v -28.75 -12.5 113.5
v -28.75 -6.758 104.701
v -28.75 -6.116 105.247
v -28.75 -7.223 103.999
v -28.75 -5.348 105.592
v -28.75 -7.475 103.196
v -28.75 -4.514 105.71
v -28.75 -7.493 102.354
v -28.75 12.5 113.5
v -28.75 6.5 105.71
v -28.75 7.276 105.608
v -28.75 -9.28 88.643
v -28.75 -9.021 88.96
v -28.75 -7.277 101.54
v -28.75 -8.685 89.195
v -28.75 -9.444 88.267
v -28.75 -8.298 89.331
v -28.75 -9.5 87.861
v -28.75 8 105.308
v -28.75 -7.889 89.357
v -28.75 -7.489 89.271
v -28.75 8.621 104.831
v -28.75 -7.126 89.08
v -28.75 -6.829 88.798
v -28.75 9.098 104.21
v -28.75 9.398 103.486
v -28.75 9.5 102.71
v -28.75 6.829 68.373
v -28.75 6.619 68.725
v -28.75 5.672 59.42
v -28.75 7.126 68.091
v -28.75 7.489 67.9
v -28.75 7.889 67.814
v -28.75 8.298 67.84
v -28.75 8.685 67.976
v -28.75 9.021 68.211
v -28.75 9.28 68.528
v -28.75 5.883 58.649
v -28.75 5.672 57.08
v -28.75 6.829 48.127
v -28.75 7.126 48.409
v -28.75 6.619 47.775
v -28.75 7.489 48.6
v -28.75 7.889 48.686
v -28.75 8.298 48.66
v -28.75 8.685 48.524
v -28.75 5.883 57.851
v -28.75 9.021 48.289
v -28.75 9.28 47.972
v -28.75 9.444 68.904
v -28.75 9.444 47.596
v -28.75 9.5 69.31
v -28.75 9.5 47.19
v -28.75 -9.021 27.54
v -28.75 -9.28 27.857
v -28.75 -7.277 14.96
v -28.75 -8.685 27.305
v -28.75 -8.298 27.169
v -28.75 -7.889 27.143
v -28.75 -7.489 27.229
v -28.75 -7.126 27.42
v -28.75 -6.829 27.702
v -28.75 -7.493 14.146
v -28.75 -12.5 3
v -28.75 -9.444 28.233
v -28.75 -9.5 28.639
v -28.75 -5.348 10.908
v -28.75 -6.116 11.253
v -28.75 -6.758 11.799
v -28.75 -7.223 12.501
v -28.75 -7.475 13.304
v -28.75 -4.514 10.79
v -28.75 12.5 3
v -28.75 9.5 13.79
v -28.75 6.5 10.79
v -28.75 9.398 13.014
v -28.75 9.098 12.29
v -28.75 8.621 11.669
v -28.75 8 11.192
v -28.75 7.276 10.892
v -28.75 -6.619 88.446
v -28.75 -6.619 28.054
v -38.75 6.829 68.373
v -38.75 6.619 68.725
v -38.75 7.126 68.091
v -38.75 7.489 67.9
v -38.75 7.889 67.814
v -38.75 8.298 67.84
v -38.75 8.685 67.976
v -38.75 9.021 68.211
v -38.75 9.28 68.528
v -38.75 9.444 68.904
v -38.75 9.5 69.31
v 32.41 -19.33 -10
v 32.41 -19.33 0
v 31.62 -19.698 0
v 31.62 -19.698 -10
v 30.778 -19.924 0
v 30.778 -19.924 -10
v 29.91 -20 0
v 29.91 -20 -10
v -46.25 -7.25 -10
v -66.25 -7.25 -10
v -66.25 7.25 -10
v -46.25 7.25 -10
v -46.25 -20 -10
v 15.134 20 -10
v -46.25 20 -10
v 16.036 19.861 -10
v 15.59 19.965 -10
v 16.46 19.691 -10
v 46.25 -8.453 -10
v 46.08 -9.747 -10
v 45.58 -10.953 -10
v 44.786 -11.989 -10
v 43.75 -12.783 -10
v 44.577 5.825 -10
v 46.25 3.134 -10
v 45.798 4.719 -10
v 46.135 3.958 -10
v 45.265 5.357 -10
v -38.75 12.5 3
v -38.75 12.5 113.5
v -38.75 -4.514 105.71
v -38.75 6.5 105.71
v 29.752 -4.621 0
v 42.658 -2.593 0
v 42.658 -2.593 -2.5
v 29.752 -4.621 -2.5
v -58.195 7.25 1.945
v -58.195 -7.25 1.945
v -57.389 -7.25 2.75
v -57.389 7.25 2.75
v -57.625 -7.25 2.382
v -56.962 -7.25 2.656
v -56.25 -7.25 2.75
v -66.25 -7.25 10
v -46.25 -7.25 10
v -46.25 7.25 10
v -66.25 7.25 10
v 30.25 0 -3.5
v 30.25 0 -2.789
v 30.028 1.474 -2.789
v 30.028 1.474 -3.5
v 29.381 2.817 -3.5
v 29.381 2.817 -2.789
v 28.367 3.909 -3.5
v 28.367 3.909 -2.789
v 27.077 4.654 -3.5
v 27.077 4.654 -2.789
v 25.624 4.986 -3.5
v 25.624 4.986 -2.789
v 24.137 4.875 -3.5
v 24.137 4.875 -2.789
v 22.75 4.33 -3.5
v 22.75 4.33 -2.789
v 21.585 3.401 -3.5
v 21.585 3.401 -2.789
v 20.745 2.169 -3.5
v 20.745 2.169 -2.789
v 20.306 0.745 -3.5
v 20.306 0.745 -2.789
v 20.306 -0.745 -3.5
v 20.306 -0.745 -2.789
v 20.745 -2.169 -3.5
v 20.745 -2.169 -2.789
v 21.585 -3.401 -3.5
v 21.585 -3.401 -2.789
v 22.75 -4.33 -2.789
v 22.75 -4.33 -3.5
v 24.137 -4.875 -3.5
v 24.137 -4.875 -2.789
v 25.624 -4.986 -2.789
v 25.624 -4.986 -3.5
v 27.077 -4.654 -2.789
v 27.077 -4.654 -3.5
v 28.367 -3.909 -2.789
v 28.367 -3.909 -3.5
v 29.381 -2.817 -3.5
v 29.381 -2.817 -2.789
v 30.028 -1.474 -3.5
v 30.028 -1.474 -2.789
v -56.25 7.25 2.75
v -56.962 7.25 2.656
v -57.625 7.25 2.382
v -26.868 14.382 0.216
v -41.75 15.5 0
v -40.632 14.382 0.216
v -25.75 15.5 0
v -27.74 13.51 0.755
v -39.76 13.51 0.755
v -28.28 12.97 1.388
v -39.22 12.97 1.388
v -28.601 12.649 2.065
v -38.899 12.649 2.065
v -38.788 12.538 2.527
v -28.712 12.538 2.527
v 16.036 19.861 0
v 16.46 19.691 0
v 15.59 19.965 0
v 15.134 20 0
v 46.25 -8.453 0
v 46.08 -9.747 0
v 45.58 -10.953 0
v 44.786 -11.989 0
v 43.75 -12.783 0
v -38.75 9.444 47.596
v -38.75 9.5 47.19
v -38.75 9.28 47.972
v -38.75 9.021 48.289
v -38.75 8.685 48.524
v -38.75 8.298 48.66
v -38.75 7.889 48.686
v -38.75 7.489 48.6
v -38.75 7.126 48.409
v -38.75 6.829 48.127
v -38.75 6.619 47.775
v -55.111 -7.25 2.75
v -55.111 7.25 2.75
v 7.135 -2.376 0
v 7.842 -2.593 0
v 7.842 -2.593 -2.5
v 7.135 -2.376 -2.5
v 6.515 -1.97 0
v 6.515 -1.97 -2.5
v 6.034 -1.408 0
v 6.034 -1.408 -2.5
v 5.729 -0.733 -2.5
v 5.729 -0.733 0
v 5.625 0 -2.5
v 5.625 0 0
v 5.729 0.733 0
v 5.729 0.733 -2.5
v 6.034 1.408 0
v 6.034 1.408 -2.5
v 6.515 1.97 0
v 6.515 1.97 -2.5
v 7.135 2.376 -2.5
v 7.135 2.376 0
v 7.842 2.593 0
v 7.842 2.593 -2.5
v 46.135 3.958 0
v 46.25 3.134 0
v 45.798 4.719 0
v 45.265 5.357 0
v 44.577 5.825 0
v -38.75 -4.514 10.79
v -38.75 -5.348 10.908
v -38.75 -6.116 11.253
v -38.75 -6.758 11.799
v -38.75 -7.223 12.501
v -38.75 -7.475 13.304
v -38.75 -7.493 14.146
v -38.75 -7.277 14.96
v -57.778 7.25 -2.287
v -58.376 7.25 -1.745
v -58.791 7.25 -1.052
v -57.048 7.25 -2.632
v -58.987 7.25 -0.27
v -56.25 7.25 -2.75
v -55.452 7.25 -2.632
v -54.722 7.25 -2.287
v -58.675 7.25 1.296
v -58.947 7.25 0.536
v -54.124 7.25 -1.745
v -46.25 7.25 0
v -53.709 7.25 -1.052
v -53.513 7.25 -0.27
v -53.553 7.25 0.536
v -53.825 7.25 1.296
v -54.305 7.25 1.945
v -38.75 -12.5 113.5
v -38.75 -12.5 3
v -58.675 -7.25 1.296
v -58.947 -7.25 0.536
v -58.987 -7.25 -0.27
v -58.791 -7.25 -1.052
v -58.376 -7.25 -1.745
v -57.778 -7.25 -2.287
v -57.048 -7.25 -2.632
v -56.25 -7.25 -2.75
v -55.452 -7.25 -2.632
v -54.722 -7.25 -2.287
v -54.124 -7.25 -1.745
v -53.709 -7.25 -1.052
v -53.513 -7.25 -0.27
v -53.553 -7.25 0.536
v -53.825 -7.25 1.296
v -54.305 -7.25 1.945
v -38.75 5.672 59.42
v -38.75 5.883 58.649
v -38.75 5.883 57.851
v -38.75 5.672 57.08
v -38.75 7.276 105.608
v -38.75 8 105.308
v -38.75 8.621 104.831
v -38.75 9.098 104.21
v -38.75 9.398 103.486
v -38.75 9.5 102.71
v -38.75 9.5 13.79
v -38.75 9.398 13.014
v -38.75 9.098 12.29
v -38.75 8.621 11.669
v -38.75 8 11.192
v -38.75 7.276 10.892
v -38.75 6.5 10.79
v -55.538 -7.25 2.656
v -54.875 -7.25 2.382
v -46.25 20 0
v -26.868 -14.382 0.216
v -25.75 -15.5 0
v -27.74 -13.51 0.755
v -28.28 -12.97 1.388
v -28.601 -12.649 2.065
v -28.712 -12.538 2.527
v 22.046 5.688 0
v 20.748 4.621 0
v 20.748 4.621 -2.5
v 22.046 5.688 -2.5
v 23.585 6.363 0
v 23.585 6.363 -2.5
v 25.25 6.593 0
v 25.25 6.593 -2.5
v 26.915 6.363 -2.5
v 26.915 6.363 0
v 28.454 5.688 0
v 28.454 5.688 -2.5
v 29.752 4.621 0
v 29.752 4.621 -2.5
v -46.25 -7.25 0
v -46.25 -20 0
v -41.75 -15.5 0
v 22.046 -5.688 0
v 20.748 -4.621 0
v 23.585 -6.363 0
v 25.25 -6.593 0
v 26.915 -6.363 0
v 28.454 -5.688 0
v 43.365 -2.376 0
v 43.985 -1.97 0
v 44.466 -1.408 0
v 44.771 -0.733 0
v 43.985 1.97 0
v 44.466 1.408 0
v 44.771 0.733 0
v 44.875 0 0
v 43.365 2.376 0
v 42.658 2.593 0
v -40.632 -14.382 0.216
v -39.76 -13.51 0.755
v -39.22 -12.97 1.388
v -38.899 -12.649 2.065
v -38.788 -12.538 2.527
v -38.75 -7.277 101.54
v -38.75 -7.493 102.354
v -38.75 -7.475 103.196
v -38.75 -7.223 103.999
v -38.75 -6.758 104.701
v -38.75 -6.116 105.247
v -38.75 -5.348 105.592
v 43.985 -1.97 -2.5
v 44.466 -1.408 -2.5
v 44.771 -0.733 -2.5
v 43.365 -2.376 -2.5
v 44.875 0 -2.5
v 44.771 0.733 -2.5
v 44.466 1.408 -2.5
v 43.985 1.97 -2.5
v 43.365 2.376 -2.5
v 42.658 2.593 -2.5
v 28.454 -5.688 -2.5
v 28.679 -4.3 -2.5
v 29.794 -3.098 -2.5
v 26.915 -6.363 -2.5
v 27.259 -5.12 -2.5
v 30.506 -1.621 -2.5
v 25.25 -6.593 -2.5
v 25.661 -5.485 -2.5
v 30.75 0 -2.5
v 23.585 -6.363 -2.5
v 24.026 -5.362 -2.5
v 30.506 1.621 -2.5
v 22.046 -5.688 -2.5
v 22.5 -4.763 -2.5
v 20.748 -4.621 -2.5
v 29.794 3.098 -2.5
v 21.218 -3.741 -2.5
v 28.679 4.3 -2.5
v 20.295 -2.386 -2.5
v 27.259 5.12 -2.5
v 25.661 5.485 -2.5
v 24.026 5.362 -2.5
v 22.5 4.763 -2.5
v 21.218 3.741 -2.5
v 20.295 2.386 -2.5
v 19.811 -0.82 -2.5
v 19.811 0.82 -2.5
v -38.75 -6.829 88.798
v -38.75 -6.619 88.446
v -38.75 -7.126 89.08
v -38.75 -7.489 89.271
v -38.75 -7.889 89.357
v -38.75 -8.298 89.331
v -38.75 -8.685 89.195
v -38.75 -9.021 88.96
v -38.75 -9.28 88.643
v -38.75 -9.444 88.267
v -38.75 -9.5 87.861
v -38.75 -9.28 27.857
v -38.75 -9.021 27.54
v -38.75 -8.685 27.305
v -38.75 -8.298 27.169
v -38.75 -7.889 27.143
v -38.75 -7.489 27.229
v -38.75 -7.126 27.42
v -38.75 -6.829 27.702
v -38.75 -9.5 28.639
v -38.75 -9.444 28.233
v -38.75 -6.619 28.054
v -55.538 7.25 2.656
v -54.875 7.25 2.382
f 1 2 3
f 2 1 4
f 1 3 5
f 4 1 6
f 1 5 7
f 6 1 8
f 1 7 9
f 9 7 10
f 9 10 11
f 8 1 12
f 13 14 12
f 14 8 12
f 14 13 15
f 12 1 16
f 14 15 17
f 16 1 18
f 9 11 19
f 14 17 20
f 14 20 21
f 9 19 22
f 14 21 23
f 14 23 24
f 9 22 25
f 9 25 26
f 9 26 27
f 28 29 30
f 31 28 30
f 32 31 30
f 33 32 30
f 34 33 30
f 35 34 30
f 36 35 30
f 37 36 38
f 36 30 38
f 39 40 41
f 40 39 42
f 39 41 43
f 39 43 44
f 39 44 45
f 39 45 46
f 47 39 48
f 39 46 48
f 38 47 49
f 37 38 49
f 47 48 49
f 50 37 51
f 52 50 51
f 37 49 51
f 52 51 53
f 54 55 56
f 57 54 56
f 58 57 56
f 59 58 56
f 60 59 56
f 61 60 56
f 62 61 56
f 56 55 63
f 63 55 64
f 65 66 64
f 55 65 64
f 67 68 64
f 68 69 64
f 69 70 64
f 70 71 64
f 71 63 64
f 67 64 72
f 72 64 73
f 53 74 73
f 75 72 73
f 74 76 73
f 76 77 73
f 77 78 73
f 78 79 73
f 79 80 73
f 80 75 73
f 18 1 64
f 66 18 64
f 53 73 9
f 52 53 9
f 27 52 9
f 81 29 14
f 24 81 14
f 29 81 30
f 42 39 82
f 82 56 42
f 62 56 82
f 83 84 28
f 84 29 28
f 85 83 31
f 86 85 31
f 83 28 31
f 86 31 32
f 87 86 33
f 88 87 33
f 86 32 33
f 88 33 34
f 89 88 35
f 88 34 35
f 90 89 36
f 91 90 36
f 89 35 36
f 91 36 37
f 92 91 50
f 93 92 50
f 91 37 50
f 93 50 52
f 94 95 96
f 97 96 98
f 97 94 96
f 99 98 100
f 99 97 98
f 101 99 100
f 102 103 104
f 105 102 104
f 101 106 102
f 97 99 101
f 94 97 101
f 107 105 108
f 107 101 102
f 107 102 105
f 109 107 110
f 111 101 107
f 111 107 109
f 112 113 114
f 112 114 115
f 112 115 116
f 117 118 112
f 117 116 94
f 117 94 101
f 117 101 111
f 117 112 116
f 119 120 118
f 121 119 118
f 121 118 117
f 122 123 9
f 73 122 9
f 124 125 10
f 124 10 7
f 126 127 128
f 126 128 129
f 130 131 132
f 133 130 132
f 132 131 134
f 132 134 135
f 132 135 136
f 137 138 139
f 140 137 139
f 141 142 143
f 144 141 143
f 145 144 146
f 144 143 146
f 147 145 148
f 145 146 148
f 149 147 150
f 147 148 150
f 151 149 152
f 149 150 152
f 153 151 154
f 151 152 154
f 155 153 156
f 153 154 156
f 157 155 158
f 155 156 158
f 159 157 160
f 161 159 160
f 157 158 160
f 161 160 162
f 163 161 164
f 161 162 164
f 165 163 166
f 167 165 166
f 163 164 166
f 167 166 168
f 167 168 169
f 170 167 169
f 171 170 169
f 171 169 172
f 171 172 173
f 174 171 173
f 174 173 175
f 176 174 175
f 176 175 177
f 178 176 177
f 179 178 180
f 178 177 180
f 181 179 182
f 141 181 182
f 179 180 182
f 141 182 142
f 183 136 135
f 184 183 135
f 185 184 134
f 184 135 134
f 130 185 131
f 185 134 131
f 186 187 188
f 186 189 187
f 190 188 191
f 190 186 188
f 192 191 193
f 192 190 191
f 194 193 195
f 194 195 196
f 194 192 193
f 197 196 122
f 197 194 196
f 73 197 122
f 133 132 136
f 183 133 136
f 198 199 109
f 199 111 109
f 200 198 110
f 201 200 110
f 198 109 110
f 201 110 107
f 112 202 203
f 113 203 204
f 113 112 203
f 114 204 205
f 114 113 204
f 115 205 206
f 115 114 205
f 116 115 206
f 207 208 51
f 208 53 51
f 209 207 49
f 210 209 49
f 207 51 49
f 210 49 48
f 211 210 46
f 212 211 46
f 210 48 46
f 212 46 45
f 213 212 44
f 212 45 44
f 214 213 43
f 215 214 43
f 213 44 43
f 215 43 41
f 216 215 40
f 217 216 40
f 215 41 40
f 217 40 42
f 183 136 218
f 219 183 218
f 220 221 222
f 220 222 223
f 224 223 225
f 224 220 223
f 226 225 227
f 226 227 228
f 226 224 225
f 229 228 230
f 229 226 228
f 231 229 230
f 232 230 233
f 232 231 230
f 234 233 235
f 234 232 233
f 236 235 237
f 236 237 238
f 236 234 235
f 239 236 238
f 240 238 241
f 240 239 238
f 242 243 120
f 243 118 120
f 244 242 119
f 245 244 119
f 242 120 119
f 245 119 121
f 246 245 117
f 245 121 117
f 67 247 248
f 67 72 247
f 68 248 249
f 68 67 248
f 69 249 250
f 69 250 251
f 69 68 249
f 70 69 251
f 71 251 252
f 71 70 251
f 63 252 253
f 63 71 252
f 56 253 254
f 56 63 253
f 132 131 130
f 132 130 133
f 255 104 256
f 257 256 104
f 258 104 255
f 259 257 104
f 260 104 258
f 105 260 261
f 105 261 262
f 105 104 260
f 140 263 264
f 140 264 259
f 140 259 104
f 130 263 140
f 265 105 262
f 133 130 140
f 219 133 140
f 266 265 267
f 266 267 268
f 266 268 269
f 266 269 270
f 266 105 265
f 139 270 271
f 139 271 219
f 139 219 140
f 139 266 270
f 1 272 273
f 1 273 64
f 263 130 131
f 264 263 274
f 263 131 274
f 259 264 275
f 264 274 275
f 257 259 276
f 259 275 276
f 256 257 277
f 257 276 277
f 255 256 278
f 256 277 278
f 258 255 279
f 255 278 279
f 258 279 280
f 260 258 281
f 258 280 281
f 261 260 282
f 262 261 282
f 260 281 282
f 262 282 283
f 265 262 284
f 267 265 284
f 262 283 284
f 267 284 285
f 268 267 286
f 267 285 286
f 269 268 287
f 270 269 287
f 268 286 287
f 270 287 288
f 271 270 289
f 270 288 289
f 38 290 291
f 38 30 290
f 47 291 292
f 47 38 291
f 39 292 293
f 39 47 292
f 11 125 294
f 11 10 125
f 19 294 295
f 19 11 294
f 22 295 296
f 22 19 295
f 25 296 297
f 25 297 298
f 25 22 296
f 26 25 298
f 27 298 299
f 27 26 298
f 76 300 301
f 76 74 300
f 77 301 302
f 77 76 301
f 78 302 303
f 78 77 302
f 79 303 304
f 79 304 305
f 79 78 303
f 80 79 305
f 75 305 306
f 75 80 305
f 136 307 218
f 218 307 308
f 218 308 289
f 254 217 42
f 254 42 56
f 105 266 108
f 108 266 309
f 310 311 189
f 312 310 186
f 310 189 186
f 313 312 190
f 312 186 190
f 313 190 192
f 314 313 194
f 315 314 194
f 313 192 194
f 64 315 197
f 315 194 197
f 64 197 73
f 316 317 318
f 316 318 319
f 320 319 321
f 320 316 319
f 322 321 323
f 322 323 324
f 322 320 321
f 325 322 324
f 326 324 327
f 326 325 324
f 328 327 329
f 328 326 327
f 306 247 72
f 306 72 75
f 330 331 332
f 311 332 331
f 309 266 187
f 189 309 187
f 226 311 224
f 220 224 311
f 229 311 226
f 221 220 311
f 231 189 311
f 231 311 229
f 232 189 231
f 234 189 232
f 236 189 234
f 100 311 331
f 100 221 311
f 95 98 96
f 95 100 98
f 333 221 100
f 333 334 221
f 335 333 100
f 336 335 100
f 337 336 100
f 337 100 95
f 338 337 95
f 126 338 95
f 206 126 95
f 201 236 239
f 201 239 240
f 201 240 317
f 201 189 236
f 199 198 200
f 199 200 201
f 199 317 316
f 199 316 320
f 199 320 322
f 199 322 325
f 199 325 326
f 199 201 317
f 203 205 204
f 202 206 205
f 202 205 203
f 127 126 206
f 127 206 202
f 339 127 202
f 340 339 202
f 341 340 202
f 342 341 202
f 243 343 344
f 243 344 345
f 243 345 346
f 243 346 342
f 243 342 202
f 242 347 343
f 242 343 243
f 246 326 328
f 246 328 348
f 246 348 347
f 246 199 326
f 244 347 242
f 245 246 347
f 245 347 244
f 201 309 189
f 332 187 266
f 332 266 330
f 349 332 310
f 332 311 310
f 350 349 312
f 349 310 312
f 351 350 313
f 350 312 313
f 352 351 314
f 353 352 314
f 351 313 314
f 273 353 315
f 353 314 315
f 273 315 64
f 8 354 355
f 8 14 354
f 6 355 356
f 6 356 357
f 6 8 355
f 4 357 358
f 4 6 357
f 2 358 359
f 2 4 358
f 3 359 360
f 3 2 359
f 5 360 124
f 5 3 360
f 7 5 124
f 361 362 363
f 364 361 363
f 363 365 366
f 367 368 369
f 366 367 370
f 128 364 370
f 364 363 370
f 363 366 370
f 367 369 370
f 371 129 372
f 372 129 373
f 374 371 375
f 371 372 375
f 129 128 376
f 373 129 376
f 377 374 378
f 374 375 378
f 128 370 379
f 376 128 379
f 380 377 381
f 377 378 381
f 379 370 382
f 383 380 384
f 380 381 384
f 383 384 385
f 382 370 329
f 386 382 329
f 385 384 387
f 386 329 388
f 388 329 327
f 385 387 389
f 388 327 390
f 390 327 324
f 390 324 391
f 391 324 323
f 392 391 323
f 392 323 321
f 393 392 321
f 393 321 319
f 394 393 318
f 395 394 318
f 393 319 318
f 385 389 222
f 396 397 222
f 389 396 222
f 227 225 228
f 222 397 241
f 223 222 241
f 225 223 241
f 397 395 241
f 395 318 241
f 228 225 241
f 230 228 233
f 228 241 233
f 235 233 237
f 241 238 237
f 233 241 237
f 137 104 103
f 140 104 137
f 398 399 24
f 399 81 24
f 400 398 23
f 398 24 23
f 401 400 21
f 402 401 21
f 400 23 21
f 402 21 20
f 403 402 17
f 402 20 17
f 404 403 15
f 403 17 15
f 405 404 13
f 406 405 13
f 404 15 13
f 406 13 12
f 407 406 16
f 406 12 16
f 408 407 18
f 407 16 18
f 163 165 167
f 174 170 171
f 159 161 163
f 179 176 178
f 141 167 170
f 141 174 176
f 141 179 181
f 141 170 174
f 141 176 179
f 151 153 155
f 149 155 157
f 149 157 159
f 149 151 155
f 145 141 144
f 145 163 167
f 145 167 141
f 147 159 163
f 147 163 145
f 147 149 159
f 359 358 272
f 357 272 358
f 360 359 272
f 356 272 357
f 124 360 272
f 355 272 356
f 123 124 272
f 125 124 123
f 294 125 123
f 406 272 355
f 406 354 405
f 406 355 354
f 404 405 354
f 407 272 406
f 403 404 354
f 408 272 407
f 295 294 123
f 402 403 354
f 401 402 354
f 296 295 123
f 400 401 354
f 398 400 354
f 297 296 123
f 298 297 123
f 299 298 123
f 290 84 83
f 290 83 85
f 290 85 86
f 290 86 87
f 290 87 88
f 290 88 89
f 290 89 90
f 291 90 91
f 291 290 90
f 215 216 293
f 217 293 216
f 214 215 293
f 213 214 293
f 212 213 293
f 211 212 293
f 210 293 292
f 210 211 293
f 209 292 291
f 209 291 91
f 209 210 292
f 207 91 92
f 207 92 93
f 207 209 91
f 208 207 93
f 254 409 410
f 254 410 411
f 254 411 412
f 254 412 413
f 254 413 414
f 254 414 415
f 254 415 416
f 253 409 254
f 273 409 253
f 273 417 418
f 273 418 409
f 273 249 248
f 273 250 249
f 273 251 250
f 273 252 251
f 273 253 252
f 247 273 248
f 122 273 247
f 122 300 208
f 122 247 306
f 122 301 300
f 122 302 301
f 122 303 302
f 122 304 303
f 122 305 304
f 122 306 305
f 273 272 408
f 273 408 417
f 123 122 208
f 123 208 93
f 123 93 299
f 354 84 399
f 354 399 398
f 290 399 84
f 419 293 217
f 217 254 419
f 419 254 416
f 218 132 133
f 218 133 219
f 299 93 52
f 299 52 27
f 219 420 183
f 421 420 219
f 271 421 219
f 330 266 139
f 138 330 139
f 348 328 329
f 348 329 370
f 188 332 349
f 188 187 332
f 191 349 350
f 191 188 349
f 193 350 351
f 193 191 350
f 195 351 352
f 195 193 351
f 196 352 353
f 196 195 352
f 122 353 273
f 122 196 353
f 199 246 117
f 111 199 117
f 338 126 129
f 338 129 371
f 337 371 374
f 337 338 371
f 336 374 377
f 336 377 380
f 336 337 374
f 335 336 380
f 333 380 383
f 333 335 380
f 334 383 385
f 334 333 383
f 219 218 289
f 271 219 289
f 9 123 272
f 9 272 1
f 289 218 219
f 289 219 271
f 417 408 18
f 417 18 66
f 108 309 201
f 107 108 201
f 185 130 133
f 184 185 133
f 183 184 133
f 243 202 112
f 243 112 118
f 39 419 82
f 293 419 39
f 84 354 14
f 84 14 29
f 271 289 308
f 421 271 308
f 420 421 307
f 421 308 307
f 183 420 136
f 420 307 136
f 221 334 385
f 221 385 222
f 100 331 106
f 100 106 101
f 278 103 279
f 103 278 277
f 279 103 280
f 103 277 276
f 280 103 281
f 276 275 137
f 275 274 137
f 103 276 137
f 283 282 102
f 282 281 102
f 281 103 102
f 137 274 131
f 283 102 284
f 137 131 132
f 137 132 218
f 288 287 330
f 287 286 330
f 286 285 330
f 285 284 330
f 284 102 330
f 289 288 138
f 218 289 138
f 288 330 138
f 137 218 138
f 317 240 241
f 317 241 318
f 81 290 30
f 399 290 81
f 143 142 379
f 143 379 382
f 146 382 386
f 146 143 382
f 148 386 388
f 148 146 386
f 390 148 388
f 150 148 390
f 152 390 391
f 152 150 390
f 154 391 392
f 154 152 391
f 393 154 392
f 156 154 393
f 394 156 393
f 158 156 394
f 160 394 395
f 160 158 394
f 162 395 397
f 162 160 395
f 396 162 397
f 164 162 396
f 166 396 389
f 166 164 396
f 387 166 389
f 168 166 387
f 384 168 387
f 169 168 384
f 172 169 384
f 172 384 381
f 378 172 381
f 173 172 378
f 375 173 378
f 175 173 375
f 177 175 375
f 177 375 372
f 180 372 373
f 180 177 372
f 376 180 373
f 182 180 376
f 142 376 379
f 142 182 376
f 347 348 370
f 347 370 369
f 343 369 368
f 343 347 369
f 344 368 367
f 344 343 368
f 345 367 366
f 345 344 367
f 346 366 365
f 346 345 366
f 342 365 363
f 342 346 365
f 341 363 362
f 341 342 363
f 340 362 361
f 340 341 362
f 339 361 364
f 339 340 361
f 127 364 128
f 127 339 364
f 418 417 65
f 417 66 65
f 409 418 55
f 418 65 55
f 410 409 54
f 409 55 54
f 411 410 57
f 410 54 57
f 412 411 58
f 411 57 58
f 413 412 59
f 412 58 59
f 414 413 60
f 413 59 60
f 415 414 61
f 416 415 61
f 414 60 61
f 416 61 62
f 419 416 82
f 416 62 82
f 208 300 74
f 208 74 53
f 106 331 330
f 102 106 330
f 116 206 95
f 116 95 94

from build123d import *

# Parameters (mm, degrees)
SKETCH3_W            = 92.5
SKETCH3_H            = 40
BOSS_EXTRUDE1_DEPTH  = 10
CUT_EXTRUDE1_DEPTH   = 2.5
SKETCH21_W           = 10
SKETCH21_H           = 25
BOSS_EXTRUDE11_DEPTH = 113.5
FILLET1_R            = 3
CUT_EXTRUDE2_DEPTH   = 144.203526493
FILLET4_R            = 3
FILLET5_R            = 1.5
SKETCH25_W           = 20
SKETCH25_H           = 14.5
BOSS_EXTRUDE12_DEPTH = 20
M5_CLEARANCE_HOLE1_D = 5.5
CHAMFER1_SIZE        = 15
CHAMFER1_SIZE2       = 30.41699103
CHAMFER2_SIZE        = 15
CHAMFER2_SIZE2       = 8.660254038
FILLET6_R            = 3
FILLET7_R            = 5
SKETCH28_R           = 5
CUT_EXTRUDE3_DEPTH   = 1
CHAMFER3_SIZE        = 0.5
CHAMFER3_SIZE2       = 0.288675135
SPLIT1_START         = -7.25
SPLIT1_DEPTH         = 14.5
SPLIT1_2_DEPTH       = 14.5
SPLIT1_3_DEPTH       = 14.5


# Read off the part's stored shape, not the designer's step: Split1
with BuildPart() as part:
    # Sketch3 → Boss-Extrude1 (new body)
    with BuildSketch(Plane.XY):
        Rectangle(SKETCH3_W, SKETCH3_H)
    extrude(amount=-BOSS_EXTRUDE1_DEPTH)

    # Sketch2 → Cut-Extrude1 (cut)
    with BuildSketch(Plane.XY):
        with BuildLine():
            Line((7.842480092, 2.593174218), (20.7479962, 4.621288911))
            ThreePointArc((20.7479962, 4.621288911), (25.25, 6.593267506), (29.7520038, 4.621288911))
            Line((29.7520038, 4.621288911), (42.657519908, 2.593174218))
            ThreePointArc((42.657519908, 2.593174218), (44.875, 0), (42.657519908, -2.593174218))
            Line((42.657519908, -2.593174218), (29.7520038, -4.621288911))
            ThreePointArc((29.7520038, -4.621288911), (25.25, -6.593267506), (20.7479962, -4.621288911))
            Line((20.7479962, -4.621288911), (7.842480092, -2.593174218))
            ThreePointArc((7.842480092, -2.593174218), (5.625, 0), (7.842480092, 2.593174218))
        make_face()
    extrude(amount=-CUT_EXTRUDE1_DEPTH, mode=Mode.SUBTRACT)

    # Sketch21 → Boss-Extrude11 (add)
    with BuildSketch(Plane.XY):
        with Locations((-33.75, 0)):
            Rectangle(SKETCH21_W, SKETCH21_H)
    extrude(amount=BOSS_EXTRUDE11_DEPTH)

    # Fillet1
    fillet1_edges = [part.edges().sort_by_distance(p)[0] for p in [
        (-28.75, 0, 0),
        (-33.75, 12.5, 0),
        (-38.75, 0, 0),
        (-33.75, -12.5, 0),
    ]]
    fillet(fillet1_edges, radius=FILLET1_R)

    # Sketch24 → Cut-Extrude2 (cut, through all)
    with BuildSketch(Plane.ZY.offset(38.75)):
        Polygon((95.25, -9.5), (21.25, -9.5), (58.25, 6.167532718), align=None)
        Polygon((54.57929411, 9.5), (10.790027833, -9.042426002), (10.790027833, 9.5), align=None)
        Polygon((61.92070589, 9.5), (105.709972167, 9.5), (105.709972167, -9.042426002), align=None)
    extrude(amount=-CUT_EXTRUDE2_DEPTH, mode=Mode.SUBTRACT)

    # Fillet4
    fillet4_edges = [part.edges().sort_by_distance(p)[0] for p in [
        (-33.75, 9.5, 10.790027833),
        (-33.75, -9.042426002, 10.790027833),
        (-33.75, -9.042426002, 105.709972167),
        (-33.75, 9.5, 105.709972167),
        (-33.75, 6.167532718, 58.25),
    ]]
    fillet(fillet4_edges, radius=FILLET4_R)

    # Fillet5
    fillet5_edges = [part.edges().sort_by_distance(p)[0] for p in [
        (-33.75, 9.5, 54.57929411),
        (-33.75, 9.5, 61.92070589),
        (-33.75, -9.5, 95.25),
        (-33.75, -9.5, 21.25),
    ]]
    fillet(fillet5_edges, radius=FILLET5_R)

    # Sketch25 → Boss-Extrude12 (add)
    with BuildSketch(Plane.ZY.offset(46.25)):
        Rectangle(SKETCH25_W, SKETCH25_H)
    extrude(amount=BOSS_EXTRUDE12_DEPTH)

    # M5 Clearance Hole1 (through all)
    with Locations(Plane(origin=(0, 7.25, 0), x_dir=(1, 0, 0), z_dir=(0, 1, 0))):
        with Locations((-56.25, 0)):
            Hole(M5_CLEARANCE_HOLE1_D / 2)

    # Chamfer1
    chamfer1_edges = [part.edges().sort_by_distance(p)[0] for p in [
        (46.25, 20, -5),
    ]]
    chamfer1_side = [part.faces().sort_by_distance(p)[0] for p in [
        (46.25, 0, -5),
    ]]
    chamfer(chamfer1_edges, length=CHAMFER1_SIZE, length2=CHAMFER1_SIZE2, reference=chamfer1_side[0])

    # Chamfer2
    chamfer2_edges = [part.edges().sort_by_distance(p)[0] for p in [
        (46.25, -20, -5),
    ]]
    chamfer2_side = [part.faces().sort_by_distance(p)[0] for p in [
        (0, -20, -5),
    ]]
    chamfer(chamfer2_edges, length=CHAMFER2_SIZE, length2=CHAMFER2_SIZE2, reference=chamfer2_side[0])

    # Fillet6
    fillet6_edges = [part.edges().sort_by_distance(p)[0] for p in [
        (46.25, 5, -5),
        (15.83300897, 20, -5),
    ]]
    fillet(fillet6_edges, radius=FILLET6_R)

    # Fillet7
    fillet7_edges = [part.edges().sort_by_distance(p)[0] for p in [
        (31.25, -20, -5),
        (46.25, -11.339745962, -5),
    ]]
    fillet(fillet7_edges, radius=FILLET7_R)

    # Sketch28 → Cut-Extrude3 (cut)
    with BuildSketch(Plane.XY.offset(-2.5)):
        with Locations((25.25, 0)):
            Circle(SKETCH28_R)
    extrude(amount=-CUT_EXTRUDE3_DEPTH, mode=Mode.SUBTRACT)

    # Chamfer3
    chamfer3_edges = [part.edges().sort_by_distance(p)[0] for p in [
        (20.25, 0, -2.5),
    ]]
    chamfer3_side = [part.faces().sort_by_distance(p)[0] for p in [
        (14.359518991, -3.198192821, -2.5),
    ]]
    chamfer(chamfer3_edges, length=CHAMFER3_SIZE, length2=CHAMFER3_SIZE2, reference=chamfer3_side[0])

    # Split1 2 outline → Split1 2 (cut)
    with BuildSketch(Plane(origin=(0, 0, 0), x_dir=(1, 0, 0), z_dir=(0, 1, 0)).offset(SPLIT1_START)):
        with BuildLine():
            ThreePointArc((-56.25, -2.75), (-57.302379439, -2.540668714), (-58.194543648, -1.944543648))
            Line((-58.194543648, -1.944543648), (-57.389087297, -2.75))
            Line((-57.389087297, -2.75), (-56.25, -2.75))
        make_face()
        with BuildLine():
            ThreePointArc((-54.305456352, -1.944543648), (-55.197620561, -2.540668714), (-56.25, -2.75))
            Line((-56.25, -2.75), (-55.110912703, -2.75))
            Line((-55.110912703, -2.75), (-54.305456352, -1.944543648))
        make_face()
    extrude(amount=SPLIT1_2_DEPTH, mode=Mode.SUBTRACT)


with BuildPart() as body_2:
    # Split1 outline → Split1 (new body)
    with BuildSketch(Plane(origin=(0, 0, 0), x_dir=(1, 0, 0), z_dir=(0, 1, 0)).offset(SPLIT1_START)):
        with BuildLine():
            Line((-58.194543648, -1.944543648), (-57.389087297, -2.75))
            Line((-57.389087297, -2.75), (-56.25, -2.75))
            ThreePointArc((-56.25, -2.75), (-57.302379439, -2.540668714), (-58.194543648, -1.944543648))
        make_face()
    extrude(amount=SPLIT1_DEPTH)


with BuildPart() as body_3:
    # Split1 3 outline → Split1 3 (new body)
    with BuildSketch(Plane(origin=(0, 0, 0), x_dir=(1, 0, 0), z_dir=(0, 1, 0)).offset(SPLIT1_START)):
        with BuildLine():
            Line((-56.25, -2.75), (-55.110912703, -2.75))
            Line((-55.110912703, -2.75), (-54.305456352, -1.944543648))
            ThreePointArc((-54.305456352, -1.944543648), (-55.197620561, -2.540668714), (-56.25, -2.75))
        make_face()
    extrude(amount=SPLIT1_3_DEPTH)


solid = Compound([part.part, body_2.part, body_3.part])
